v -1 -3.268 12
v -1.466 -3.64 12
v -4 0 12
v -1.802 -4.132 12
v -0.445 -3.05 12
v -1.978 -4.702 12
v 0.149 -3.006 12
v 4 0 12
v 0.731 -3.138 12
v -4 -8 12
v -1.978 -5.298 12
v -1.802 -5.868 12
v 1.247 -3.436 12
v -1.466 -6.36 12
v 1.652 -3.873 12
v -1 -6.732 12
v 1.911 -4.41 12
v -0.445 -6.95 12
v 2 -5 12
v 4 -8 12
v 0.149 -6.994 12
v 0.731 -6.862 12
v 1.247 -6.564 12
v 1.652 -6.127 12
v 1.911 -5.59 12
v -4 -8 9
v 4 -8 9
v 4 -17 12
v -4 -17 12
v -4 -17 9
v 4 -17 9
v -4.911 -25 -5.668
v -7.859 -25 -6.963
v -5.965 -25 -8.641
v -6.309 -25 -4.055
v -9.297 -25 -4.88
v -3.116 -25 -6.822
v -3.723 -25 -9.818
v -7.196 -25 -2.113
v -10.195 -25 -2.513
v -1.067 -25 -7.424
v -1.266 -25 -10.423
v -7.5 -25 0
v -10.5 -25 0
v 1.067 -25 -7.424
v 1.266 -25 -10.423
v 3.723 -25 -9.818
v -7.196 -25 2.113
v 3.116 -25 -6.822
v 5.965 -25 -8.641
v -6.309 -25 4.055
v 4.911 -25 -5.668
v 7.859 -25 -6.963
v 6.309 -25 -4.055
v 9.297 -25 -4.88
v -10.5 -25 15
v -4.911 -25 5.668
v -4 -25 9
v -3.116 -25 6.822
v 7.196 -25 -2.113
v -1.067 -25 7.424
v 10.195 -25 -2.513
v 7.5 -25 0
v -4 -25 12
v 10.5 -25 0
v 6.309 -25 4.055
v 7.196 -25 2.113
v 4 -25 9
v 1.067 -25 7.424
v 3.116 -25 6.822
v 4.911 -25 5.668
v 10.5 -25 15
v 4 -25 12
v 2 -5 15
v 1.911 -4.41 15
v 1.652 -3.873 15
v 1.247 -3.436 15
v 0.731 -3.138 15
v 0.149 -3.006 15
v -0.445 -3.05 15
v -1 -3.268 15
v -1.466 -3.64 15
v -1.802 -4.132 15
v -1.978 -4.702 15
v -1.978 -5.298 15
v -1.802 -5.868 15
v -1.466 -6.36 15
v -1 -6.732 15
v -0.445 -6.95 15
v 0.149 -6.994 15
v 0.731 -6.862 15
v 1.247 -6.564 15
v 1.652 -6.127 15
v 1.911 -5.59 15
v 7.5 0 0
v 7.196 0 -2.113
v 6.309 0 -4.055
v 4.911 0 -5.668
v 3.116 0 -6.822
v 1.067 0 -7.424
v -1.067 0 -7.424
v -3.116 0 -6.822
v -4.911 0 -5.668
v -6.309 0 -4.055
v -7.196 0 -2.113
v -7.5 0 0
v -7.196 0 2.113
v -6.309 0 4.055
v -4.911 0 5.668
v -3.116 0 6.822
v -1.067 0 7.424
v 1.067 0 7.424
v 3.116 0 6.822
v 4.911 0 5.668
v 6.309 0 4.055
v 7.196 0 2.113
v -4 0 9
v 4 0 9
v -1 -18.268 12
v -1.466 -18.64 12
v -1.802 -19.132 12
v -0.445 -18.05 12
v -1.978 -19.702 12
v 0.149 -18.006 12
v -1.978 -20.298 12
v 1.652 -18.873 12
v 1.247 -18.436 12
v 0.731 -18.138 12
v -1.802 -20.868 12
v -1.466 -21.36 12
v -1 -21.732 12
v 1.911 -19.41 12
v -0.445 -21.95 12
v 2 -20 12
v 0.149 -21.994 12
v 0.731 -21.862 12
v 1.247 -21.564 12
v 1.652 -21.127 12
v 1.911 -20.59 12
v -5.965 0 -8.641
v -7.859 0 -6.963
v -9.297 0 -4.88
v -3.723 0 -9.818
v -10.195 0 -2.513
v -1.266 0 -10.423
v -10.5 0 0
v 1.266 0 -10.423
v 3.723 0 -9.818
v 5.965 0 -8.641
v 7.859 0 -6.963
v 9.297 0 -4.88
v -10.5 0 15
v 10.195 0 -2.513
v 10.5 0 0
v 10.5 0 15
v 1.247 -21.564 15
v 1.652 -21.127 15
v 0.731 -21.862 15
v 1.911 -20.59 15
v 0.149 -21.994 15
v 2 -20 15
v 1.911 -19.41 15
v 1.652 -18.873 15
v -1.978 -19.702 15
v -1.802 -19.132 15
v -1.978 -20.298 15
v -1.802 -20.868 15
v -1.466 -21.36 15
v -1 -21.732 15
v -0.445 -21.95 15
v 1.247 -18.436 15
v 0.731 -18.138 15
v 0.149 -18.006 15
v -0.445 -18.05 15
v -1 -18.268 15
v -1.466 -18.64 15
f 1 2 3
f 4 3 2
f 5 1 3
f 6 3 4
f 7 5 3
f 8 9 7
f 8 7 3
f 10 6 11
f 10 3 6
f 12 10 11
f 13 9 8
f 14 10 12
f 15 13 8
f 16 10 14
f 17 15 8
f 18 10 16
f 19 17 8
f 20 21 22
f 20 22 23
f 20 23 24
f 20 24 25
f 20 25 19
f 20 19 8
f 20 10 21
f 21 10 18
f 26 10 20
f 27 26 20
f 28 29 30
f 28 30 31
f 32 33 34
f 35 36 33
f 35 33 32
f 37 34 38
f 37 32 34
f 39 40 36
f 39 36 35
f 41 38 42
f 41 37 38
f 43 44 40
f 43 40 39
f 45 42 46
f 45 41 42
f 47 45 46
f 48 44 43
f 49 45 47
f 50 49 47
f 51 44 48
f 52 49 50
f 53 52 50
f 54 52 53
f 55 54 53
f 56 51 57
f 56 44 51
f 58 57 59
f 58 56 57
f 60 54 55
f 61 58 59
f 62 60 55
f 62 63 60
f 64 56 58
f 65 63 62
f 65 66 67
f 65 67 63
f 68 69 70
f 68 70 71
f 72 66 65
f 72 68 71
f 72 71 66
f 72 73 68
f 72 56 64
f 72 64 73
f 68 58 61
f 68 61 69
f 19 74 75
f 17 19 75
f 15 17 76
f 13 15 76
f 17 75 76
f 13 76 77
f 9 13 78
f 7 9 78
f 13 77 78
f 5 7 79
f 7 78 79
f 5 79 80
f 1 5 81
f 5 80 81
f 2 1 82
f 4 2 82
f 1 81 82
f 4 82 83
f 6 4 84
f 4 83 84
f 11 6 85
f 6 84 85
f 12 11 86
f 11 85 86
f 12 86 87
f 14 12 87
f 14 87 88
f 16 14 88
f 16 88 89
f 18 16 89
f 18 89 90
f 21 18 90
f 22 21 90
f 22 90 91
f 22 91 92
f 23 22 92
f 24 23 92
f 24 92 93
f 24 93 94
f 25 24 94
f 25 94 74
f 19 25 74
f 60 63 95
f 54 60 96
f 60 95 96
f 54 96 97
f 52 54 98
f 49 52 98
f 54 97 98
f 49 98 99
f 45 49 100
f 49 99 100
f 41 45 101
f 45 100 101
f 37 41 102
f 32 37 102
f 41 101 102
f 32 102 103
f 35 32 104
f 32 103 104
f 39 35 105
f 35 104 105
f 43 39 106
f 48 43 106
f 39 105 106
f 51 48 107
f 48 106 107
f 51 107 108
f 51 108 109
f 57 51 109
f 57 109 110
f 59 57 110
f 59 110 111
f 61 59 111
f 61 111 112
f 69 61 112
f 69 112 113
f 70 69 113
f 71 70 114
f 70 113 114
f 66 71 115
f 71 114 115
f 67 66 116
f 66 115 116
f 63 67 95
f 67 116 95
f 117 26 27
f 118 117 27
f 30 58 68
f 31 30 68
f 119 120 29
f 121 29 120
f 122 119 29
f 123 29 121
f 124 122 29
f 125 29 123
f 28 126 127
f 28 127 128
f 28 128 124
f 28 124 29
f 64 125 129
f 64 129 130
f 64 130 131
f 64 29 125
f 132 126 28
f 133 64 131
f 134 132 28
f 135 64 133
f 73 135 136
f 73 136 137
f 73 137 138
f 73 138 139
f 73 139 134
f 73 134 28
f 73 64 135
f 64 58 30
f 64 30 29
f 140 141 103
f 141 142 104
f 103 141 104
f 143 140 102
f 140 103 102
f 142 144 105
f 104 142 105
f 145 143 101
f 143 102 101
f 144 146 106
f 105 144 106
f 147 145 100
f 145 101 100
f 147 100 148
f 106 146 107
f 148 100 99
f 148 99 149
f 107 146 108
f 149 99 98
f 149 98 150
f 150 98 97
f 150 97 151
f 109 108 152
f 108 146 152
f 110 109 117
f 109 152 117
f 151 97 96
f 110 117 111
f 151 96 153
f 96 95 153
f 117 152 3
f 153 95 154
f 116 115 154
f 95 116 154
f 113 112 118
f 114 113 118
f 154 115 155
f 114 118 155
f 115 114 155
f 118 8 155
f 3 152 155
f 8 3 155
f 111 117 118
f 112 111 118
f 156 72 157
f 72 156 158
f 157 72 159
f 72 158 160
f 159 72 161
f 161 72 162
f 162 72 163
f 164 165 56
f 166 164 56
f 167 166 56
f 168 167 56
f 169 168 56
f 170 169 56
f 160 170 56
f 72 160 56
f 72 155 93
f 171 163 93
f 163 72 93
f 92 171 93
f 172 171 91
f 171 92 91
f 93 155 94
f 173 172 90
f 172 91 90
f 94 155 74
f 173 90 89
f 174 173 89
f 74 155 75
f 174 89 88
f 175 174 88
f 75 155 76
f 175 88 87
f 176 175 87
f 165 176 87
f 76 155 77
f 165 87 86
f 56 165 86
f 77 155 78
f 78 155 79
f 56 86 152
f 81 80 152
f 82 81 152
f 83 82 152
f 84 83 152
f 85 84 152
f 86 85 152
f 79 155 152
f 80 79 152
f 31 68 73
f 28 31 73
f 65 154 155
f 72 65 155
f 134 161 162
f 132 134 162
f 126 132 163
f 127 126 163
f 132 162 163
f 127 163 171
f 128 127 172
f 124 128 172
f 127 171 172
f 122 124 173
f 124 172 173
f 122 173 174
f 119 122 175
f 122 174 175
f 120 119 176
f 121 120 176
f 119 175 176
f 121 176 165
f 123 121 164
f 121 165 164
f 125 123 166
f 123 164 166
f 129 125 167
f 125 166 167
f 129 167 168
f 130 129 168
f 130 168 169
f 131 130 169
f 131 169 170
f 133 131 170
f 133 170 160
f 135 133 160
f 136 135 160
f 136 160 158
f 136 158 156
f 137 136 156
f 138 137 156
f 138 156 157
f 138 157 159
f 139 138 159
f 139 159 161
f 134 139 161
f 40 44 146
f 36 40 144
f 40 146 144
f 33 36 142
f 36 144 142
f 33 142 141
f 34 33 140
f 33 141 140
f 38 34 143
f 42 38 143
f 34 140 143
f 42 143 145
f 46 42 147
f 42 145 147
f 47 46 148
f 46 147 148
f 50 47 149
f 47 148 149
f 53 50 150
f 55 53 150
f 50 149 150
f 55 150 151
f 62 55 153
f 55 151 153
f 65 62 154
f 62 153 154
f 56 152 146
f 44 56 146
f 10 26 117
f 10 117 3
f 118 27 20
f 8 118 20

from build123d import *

# Parameters (mm, degrees)
F1_DEPTH        = 25
F2_R            = 2
F3_DEPTH        = 6
F4_W            = 8
F4_H            = 3
F5_DEPTH        = 8
F5_COPIES_COUNT = 2
F5_COPIES_PITCH = 17


# Not quite as in the source:
# - a pattern or mirror of a feature is missing from the dataset's text; its kind, count and spacing are read off the source's solid


with BuildPart() as f1:
    # F0 (on Front) → F1 (new body)
    with BuildSketch(Plane.XZ):
        with BuildLine():
            ThreePointArc((-10.5, 0), (0, 10.5), (10.5, 0))
            Line((10.5, 0), (10.5, 15))
            Line((10.5, 15), (-10.5, 15))
            Line((-10.5, 15), (-10.5, 0))
        make_face()
        with BuildLine():
            Line((10.5, 0), (7.5, 0))
            ThreePointArc((7.5, 0), (0, -7.5), (-7.5, 0))
            Line((-7.5, 0), (-10.5, 0))
            ThreePointArc((-10.5, 0), (0, -10.5), (10.5, 0))
        make_face()
        with BuildLine():
            ThreePointArc((-7.5, 0), (0, 7.5), (7.5, 0))
            Line((7.5, 0), (10.5, 0))
            ThreePointArc((10.5, 0), (0, 10.5), (-10.5, 0))
            Line((-10.5, 0), (-7.5, 0))
        make_face()
    extrude(amount=F1_DEPTH)

    # F2 (on face) → F3 (cut)
    with BuildSketch(Plane.XY.offset(15)):
        with Locations((0, -5)):
            Circle(F2_R)
        with Locations((0, -20)):
            Circle(F2_R)
    extrude(amount=-F3_DEPTH, mode=Mode.SUBTRACT)

    # F4 (on face) → F5 (cut)
    with BuildSketch(Plane.XZ.offset(25)):
        with Locations((0, 10.5)):
            Rectangle(F4_W, F4_H)
    f5 = extrude(amount=-F5_DEPTH, mode=Mode.SUBTRACT)

    # F5_copies: F5 ×2
    with Locations(*[(0, i * F5_COPIES_PITCH, 0) for i in range(1, F5_COPIES_COUNT)]):
        add(f5, mode=Mode.SUBTRACT)


solid = f1.part
